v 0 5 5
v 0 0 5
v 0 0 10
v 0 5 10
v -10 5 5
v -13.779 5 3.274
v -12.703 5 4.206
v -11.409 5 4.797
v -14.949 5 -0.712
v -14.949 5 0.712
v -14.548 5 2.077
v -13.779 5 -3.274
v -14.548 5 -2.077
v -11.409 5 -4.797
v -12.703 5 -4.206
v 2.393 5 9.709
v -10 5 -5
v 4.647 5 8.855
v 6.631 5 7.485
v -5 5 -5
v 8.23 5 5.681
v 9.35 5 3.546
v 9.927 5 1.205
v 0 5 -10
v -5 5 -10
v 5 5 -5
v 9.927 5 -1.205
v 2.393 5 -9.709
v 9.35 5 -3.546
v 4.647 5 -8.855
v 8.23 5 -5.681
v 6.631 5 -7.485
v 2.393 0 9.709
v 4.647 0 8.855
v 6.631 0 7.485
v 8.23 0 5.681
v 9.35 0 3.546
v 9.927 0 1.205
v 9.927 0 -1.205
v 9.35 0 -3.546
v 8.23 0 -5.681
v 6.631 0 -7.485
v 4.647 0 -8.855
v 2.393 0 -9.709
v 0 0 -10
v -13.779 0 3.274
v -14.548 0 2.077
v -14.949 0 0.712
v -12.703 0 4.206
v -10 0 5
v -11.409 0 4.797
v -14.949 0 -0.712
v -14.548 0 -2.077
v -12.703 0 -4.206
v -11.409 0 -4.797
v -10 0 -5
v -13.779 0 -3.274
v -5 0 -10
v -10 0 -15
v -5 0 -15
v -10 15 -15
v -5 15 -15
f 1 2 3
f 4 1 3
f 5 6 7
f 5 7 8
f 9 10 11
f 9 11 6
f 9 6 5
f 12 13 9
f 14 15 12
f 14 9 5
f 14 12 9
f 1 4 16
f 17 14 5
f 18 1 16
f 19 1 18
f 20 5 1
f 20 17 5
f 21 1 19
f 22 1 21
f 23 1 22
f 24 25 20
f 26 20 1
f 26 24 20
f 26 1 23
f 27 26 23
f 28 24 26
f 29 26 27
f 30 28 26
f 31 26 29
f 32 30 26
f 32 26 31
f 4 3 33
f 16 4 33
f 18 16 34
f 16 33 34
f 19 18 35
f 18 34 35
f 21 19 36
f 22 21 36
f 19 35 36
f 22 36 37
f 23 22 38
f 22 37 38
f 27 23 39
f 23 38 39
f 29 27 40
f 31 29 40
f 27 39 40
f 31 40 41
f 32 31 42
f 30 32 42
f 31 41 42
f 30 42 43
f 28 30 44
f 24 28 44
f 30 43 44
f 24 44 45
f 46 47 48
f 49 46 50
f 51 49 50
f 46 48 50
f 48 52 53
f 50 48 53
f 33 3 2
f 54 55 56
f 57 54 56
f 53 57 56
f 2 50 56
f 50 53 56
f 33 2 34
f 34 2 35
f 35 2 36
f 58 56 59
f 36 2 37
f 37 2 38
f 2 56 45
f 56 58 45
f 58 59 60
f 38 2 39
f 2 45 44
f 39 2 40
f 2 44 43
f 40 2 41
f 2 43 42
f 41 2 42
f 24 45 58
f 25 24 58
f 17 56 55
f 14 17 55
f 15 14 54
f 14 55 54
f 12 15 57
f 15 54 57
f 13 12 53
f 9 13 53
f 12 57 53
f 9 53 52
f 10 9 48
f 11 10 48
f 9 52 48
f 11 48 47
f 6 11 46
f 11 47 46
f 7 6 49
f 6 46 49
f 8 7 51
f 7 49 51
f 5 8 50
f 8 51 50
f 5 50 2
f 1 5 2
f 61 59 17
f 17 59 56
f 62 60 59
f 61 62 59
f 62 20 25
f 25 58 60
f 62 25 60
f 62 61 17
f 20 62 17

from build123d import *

# Parameters (mm, degrees)
EXTRUDE_1_DEPTH     = 5
EXTRUDE_2_DEPTH     = 15
CUT_EXTRUDE_1_DEPTH = 15


with BuildPart() as part:
    # 草圖1 → 填料-伸長1 (new body)
    with BuildSketch(Plane(origin=(0, 0, 0), x_dir=(1, 0, 0), z_dir=(0, 1, 0))):
        with BuildLine():
            ThreePointArc((-10, 5), (-15, 0), (-10, -5))
            Line((-10, -5), (0, -5))
            Line((0, -5), (0, -10))
            ThreePointArc((0, -10), (10, 0), (0, 10))
            Line((0, 10), (-5, 10))
            Line((-5, 10), (-5, 5))
            Line((-5, 5), (-10, 5))
        make_face()
    extrude(amount=EXTRUDE_1_DEPTH)

    # 草圖1<3> → 填料-伸長2 (add)
    with BuildSketch(Plane(origin=(0, 0, 0), x_dir=(1, 0, 0), z_dir=(0, 1, 0))):
        Polygon((-10, 15), (-10, 5), (-5, 5), (-5, 10), (-5, 15), align=None)
    extrude(amount=EXTRUDE_2_DEPTH)

    # 草圖2 → 除料-伸長1 (cut)
    with BuildSketch(Plane.ZY.offset(10)):
        Polygon((-15, 15), (-5, 5), (-5, 15), align=None)
    extrude(amount=-CUT_EXTRUDE_1_DEPTH, mode=Mode.SUBTRACT)


solid = part.part
